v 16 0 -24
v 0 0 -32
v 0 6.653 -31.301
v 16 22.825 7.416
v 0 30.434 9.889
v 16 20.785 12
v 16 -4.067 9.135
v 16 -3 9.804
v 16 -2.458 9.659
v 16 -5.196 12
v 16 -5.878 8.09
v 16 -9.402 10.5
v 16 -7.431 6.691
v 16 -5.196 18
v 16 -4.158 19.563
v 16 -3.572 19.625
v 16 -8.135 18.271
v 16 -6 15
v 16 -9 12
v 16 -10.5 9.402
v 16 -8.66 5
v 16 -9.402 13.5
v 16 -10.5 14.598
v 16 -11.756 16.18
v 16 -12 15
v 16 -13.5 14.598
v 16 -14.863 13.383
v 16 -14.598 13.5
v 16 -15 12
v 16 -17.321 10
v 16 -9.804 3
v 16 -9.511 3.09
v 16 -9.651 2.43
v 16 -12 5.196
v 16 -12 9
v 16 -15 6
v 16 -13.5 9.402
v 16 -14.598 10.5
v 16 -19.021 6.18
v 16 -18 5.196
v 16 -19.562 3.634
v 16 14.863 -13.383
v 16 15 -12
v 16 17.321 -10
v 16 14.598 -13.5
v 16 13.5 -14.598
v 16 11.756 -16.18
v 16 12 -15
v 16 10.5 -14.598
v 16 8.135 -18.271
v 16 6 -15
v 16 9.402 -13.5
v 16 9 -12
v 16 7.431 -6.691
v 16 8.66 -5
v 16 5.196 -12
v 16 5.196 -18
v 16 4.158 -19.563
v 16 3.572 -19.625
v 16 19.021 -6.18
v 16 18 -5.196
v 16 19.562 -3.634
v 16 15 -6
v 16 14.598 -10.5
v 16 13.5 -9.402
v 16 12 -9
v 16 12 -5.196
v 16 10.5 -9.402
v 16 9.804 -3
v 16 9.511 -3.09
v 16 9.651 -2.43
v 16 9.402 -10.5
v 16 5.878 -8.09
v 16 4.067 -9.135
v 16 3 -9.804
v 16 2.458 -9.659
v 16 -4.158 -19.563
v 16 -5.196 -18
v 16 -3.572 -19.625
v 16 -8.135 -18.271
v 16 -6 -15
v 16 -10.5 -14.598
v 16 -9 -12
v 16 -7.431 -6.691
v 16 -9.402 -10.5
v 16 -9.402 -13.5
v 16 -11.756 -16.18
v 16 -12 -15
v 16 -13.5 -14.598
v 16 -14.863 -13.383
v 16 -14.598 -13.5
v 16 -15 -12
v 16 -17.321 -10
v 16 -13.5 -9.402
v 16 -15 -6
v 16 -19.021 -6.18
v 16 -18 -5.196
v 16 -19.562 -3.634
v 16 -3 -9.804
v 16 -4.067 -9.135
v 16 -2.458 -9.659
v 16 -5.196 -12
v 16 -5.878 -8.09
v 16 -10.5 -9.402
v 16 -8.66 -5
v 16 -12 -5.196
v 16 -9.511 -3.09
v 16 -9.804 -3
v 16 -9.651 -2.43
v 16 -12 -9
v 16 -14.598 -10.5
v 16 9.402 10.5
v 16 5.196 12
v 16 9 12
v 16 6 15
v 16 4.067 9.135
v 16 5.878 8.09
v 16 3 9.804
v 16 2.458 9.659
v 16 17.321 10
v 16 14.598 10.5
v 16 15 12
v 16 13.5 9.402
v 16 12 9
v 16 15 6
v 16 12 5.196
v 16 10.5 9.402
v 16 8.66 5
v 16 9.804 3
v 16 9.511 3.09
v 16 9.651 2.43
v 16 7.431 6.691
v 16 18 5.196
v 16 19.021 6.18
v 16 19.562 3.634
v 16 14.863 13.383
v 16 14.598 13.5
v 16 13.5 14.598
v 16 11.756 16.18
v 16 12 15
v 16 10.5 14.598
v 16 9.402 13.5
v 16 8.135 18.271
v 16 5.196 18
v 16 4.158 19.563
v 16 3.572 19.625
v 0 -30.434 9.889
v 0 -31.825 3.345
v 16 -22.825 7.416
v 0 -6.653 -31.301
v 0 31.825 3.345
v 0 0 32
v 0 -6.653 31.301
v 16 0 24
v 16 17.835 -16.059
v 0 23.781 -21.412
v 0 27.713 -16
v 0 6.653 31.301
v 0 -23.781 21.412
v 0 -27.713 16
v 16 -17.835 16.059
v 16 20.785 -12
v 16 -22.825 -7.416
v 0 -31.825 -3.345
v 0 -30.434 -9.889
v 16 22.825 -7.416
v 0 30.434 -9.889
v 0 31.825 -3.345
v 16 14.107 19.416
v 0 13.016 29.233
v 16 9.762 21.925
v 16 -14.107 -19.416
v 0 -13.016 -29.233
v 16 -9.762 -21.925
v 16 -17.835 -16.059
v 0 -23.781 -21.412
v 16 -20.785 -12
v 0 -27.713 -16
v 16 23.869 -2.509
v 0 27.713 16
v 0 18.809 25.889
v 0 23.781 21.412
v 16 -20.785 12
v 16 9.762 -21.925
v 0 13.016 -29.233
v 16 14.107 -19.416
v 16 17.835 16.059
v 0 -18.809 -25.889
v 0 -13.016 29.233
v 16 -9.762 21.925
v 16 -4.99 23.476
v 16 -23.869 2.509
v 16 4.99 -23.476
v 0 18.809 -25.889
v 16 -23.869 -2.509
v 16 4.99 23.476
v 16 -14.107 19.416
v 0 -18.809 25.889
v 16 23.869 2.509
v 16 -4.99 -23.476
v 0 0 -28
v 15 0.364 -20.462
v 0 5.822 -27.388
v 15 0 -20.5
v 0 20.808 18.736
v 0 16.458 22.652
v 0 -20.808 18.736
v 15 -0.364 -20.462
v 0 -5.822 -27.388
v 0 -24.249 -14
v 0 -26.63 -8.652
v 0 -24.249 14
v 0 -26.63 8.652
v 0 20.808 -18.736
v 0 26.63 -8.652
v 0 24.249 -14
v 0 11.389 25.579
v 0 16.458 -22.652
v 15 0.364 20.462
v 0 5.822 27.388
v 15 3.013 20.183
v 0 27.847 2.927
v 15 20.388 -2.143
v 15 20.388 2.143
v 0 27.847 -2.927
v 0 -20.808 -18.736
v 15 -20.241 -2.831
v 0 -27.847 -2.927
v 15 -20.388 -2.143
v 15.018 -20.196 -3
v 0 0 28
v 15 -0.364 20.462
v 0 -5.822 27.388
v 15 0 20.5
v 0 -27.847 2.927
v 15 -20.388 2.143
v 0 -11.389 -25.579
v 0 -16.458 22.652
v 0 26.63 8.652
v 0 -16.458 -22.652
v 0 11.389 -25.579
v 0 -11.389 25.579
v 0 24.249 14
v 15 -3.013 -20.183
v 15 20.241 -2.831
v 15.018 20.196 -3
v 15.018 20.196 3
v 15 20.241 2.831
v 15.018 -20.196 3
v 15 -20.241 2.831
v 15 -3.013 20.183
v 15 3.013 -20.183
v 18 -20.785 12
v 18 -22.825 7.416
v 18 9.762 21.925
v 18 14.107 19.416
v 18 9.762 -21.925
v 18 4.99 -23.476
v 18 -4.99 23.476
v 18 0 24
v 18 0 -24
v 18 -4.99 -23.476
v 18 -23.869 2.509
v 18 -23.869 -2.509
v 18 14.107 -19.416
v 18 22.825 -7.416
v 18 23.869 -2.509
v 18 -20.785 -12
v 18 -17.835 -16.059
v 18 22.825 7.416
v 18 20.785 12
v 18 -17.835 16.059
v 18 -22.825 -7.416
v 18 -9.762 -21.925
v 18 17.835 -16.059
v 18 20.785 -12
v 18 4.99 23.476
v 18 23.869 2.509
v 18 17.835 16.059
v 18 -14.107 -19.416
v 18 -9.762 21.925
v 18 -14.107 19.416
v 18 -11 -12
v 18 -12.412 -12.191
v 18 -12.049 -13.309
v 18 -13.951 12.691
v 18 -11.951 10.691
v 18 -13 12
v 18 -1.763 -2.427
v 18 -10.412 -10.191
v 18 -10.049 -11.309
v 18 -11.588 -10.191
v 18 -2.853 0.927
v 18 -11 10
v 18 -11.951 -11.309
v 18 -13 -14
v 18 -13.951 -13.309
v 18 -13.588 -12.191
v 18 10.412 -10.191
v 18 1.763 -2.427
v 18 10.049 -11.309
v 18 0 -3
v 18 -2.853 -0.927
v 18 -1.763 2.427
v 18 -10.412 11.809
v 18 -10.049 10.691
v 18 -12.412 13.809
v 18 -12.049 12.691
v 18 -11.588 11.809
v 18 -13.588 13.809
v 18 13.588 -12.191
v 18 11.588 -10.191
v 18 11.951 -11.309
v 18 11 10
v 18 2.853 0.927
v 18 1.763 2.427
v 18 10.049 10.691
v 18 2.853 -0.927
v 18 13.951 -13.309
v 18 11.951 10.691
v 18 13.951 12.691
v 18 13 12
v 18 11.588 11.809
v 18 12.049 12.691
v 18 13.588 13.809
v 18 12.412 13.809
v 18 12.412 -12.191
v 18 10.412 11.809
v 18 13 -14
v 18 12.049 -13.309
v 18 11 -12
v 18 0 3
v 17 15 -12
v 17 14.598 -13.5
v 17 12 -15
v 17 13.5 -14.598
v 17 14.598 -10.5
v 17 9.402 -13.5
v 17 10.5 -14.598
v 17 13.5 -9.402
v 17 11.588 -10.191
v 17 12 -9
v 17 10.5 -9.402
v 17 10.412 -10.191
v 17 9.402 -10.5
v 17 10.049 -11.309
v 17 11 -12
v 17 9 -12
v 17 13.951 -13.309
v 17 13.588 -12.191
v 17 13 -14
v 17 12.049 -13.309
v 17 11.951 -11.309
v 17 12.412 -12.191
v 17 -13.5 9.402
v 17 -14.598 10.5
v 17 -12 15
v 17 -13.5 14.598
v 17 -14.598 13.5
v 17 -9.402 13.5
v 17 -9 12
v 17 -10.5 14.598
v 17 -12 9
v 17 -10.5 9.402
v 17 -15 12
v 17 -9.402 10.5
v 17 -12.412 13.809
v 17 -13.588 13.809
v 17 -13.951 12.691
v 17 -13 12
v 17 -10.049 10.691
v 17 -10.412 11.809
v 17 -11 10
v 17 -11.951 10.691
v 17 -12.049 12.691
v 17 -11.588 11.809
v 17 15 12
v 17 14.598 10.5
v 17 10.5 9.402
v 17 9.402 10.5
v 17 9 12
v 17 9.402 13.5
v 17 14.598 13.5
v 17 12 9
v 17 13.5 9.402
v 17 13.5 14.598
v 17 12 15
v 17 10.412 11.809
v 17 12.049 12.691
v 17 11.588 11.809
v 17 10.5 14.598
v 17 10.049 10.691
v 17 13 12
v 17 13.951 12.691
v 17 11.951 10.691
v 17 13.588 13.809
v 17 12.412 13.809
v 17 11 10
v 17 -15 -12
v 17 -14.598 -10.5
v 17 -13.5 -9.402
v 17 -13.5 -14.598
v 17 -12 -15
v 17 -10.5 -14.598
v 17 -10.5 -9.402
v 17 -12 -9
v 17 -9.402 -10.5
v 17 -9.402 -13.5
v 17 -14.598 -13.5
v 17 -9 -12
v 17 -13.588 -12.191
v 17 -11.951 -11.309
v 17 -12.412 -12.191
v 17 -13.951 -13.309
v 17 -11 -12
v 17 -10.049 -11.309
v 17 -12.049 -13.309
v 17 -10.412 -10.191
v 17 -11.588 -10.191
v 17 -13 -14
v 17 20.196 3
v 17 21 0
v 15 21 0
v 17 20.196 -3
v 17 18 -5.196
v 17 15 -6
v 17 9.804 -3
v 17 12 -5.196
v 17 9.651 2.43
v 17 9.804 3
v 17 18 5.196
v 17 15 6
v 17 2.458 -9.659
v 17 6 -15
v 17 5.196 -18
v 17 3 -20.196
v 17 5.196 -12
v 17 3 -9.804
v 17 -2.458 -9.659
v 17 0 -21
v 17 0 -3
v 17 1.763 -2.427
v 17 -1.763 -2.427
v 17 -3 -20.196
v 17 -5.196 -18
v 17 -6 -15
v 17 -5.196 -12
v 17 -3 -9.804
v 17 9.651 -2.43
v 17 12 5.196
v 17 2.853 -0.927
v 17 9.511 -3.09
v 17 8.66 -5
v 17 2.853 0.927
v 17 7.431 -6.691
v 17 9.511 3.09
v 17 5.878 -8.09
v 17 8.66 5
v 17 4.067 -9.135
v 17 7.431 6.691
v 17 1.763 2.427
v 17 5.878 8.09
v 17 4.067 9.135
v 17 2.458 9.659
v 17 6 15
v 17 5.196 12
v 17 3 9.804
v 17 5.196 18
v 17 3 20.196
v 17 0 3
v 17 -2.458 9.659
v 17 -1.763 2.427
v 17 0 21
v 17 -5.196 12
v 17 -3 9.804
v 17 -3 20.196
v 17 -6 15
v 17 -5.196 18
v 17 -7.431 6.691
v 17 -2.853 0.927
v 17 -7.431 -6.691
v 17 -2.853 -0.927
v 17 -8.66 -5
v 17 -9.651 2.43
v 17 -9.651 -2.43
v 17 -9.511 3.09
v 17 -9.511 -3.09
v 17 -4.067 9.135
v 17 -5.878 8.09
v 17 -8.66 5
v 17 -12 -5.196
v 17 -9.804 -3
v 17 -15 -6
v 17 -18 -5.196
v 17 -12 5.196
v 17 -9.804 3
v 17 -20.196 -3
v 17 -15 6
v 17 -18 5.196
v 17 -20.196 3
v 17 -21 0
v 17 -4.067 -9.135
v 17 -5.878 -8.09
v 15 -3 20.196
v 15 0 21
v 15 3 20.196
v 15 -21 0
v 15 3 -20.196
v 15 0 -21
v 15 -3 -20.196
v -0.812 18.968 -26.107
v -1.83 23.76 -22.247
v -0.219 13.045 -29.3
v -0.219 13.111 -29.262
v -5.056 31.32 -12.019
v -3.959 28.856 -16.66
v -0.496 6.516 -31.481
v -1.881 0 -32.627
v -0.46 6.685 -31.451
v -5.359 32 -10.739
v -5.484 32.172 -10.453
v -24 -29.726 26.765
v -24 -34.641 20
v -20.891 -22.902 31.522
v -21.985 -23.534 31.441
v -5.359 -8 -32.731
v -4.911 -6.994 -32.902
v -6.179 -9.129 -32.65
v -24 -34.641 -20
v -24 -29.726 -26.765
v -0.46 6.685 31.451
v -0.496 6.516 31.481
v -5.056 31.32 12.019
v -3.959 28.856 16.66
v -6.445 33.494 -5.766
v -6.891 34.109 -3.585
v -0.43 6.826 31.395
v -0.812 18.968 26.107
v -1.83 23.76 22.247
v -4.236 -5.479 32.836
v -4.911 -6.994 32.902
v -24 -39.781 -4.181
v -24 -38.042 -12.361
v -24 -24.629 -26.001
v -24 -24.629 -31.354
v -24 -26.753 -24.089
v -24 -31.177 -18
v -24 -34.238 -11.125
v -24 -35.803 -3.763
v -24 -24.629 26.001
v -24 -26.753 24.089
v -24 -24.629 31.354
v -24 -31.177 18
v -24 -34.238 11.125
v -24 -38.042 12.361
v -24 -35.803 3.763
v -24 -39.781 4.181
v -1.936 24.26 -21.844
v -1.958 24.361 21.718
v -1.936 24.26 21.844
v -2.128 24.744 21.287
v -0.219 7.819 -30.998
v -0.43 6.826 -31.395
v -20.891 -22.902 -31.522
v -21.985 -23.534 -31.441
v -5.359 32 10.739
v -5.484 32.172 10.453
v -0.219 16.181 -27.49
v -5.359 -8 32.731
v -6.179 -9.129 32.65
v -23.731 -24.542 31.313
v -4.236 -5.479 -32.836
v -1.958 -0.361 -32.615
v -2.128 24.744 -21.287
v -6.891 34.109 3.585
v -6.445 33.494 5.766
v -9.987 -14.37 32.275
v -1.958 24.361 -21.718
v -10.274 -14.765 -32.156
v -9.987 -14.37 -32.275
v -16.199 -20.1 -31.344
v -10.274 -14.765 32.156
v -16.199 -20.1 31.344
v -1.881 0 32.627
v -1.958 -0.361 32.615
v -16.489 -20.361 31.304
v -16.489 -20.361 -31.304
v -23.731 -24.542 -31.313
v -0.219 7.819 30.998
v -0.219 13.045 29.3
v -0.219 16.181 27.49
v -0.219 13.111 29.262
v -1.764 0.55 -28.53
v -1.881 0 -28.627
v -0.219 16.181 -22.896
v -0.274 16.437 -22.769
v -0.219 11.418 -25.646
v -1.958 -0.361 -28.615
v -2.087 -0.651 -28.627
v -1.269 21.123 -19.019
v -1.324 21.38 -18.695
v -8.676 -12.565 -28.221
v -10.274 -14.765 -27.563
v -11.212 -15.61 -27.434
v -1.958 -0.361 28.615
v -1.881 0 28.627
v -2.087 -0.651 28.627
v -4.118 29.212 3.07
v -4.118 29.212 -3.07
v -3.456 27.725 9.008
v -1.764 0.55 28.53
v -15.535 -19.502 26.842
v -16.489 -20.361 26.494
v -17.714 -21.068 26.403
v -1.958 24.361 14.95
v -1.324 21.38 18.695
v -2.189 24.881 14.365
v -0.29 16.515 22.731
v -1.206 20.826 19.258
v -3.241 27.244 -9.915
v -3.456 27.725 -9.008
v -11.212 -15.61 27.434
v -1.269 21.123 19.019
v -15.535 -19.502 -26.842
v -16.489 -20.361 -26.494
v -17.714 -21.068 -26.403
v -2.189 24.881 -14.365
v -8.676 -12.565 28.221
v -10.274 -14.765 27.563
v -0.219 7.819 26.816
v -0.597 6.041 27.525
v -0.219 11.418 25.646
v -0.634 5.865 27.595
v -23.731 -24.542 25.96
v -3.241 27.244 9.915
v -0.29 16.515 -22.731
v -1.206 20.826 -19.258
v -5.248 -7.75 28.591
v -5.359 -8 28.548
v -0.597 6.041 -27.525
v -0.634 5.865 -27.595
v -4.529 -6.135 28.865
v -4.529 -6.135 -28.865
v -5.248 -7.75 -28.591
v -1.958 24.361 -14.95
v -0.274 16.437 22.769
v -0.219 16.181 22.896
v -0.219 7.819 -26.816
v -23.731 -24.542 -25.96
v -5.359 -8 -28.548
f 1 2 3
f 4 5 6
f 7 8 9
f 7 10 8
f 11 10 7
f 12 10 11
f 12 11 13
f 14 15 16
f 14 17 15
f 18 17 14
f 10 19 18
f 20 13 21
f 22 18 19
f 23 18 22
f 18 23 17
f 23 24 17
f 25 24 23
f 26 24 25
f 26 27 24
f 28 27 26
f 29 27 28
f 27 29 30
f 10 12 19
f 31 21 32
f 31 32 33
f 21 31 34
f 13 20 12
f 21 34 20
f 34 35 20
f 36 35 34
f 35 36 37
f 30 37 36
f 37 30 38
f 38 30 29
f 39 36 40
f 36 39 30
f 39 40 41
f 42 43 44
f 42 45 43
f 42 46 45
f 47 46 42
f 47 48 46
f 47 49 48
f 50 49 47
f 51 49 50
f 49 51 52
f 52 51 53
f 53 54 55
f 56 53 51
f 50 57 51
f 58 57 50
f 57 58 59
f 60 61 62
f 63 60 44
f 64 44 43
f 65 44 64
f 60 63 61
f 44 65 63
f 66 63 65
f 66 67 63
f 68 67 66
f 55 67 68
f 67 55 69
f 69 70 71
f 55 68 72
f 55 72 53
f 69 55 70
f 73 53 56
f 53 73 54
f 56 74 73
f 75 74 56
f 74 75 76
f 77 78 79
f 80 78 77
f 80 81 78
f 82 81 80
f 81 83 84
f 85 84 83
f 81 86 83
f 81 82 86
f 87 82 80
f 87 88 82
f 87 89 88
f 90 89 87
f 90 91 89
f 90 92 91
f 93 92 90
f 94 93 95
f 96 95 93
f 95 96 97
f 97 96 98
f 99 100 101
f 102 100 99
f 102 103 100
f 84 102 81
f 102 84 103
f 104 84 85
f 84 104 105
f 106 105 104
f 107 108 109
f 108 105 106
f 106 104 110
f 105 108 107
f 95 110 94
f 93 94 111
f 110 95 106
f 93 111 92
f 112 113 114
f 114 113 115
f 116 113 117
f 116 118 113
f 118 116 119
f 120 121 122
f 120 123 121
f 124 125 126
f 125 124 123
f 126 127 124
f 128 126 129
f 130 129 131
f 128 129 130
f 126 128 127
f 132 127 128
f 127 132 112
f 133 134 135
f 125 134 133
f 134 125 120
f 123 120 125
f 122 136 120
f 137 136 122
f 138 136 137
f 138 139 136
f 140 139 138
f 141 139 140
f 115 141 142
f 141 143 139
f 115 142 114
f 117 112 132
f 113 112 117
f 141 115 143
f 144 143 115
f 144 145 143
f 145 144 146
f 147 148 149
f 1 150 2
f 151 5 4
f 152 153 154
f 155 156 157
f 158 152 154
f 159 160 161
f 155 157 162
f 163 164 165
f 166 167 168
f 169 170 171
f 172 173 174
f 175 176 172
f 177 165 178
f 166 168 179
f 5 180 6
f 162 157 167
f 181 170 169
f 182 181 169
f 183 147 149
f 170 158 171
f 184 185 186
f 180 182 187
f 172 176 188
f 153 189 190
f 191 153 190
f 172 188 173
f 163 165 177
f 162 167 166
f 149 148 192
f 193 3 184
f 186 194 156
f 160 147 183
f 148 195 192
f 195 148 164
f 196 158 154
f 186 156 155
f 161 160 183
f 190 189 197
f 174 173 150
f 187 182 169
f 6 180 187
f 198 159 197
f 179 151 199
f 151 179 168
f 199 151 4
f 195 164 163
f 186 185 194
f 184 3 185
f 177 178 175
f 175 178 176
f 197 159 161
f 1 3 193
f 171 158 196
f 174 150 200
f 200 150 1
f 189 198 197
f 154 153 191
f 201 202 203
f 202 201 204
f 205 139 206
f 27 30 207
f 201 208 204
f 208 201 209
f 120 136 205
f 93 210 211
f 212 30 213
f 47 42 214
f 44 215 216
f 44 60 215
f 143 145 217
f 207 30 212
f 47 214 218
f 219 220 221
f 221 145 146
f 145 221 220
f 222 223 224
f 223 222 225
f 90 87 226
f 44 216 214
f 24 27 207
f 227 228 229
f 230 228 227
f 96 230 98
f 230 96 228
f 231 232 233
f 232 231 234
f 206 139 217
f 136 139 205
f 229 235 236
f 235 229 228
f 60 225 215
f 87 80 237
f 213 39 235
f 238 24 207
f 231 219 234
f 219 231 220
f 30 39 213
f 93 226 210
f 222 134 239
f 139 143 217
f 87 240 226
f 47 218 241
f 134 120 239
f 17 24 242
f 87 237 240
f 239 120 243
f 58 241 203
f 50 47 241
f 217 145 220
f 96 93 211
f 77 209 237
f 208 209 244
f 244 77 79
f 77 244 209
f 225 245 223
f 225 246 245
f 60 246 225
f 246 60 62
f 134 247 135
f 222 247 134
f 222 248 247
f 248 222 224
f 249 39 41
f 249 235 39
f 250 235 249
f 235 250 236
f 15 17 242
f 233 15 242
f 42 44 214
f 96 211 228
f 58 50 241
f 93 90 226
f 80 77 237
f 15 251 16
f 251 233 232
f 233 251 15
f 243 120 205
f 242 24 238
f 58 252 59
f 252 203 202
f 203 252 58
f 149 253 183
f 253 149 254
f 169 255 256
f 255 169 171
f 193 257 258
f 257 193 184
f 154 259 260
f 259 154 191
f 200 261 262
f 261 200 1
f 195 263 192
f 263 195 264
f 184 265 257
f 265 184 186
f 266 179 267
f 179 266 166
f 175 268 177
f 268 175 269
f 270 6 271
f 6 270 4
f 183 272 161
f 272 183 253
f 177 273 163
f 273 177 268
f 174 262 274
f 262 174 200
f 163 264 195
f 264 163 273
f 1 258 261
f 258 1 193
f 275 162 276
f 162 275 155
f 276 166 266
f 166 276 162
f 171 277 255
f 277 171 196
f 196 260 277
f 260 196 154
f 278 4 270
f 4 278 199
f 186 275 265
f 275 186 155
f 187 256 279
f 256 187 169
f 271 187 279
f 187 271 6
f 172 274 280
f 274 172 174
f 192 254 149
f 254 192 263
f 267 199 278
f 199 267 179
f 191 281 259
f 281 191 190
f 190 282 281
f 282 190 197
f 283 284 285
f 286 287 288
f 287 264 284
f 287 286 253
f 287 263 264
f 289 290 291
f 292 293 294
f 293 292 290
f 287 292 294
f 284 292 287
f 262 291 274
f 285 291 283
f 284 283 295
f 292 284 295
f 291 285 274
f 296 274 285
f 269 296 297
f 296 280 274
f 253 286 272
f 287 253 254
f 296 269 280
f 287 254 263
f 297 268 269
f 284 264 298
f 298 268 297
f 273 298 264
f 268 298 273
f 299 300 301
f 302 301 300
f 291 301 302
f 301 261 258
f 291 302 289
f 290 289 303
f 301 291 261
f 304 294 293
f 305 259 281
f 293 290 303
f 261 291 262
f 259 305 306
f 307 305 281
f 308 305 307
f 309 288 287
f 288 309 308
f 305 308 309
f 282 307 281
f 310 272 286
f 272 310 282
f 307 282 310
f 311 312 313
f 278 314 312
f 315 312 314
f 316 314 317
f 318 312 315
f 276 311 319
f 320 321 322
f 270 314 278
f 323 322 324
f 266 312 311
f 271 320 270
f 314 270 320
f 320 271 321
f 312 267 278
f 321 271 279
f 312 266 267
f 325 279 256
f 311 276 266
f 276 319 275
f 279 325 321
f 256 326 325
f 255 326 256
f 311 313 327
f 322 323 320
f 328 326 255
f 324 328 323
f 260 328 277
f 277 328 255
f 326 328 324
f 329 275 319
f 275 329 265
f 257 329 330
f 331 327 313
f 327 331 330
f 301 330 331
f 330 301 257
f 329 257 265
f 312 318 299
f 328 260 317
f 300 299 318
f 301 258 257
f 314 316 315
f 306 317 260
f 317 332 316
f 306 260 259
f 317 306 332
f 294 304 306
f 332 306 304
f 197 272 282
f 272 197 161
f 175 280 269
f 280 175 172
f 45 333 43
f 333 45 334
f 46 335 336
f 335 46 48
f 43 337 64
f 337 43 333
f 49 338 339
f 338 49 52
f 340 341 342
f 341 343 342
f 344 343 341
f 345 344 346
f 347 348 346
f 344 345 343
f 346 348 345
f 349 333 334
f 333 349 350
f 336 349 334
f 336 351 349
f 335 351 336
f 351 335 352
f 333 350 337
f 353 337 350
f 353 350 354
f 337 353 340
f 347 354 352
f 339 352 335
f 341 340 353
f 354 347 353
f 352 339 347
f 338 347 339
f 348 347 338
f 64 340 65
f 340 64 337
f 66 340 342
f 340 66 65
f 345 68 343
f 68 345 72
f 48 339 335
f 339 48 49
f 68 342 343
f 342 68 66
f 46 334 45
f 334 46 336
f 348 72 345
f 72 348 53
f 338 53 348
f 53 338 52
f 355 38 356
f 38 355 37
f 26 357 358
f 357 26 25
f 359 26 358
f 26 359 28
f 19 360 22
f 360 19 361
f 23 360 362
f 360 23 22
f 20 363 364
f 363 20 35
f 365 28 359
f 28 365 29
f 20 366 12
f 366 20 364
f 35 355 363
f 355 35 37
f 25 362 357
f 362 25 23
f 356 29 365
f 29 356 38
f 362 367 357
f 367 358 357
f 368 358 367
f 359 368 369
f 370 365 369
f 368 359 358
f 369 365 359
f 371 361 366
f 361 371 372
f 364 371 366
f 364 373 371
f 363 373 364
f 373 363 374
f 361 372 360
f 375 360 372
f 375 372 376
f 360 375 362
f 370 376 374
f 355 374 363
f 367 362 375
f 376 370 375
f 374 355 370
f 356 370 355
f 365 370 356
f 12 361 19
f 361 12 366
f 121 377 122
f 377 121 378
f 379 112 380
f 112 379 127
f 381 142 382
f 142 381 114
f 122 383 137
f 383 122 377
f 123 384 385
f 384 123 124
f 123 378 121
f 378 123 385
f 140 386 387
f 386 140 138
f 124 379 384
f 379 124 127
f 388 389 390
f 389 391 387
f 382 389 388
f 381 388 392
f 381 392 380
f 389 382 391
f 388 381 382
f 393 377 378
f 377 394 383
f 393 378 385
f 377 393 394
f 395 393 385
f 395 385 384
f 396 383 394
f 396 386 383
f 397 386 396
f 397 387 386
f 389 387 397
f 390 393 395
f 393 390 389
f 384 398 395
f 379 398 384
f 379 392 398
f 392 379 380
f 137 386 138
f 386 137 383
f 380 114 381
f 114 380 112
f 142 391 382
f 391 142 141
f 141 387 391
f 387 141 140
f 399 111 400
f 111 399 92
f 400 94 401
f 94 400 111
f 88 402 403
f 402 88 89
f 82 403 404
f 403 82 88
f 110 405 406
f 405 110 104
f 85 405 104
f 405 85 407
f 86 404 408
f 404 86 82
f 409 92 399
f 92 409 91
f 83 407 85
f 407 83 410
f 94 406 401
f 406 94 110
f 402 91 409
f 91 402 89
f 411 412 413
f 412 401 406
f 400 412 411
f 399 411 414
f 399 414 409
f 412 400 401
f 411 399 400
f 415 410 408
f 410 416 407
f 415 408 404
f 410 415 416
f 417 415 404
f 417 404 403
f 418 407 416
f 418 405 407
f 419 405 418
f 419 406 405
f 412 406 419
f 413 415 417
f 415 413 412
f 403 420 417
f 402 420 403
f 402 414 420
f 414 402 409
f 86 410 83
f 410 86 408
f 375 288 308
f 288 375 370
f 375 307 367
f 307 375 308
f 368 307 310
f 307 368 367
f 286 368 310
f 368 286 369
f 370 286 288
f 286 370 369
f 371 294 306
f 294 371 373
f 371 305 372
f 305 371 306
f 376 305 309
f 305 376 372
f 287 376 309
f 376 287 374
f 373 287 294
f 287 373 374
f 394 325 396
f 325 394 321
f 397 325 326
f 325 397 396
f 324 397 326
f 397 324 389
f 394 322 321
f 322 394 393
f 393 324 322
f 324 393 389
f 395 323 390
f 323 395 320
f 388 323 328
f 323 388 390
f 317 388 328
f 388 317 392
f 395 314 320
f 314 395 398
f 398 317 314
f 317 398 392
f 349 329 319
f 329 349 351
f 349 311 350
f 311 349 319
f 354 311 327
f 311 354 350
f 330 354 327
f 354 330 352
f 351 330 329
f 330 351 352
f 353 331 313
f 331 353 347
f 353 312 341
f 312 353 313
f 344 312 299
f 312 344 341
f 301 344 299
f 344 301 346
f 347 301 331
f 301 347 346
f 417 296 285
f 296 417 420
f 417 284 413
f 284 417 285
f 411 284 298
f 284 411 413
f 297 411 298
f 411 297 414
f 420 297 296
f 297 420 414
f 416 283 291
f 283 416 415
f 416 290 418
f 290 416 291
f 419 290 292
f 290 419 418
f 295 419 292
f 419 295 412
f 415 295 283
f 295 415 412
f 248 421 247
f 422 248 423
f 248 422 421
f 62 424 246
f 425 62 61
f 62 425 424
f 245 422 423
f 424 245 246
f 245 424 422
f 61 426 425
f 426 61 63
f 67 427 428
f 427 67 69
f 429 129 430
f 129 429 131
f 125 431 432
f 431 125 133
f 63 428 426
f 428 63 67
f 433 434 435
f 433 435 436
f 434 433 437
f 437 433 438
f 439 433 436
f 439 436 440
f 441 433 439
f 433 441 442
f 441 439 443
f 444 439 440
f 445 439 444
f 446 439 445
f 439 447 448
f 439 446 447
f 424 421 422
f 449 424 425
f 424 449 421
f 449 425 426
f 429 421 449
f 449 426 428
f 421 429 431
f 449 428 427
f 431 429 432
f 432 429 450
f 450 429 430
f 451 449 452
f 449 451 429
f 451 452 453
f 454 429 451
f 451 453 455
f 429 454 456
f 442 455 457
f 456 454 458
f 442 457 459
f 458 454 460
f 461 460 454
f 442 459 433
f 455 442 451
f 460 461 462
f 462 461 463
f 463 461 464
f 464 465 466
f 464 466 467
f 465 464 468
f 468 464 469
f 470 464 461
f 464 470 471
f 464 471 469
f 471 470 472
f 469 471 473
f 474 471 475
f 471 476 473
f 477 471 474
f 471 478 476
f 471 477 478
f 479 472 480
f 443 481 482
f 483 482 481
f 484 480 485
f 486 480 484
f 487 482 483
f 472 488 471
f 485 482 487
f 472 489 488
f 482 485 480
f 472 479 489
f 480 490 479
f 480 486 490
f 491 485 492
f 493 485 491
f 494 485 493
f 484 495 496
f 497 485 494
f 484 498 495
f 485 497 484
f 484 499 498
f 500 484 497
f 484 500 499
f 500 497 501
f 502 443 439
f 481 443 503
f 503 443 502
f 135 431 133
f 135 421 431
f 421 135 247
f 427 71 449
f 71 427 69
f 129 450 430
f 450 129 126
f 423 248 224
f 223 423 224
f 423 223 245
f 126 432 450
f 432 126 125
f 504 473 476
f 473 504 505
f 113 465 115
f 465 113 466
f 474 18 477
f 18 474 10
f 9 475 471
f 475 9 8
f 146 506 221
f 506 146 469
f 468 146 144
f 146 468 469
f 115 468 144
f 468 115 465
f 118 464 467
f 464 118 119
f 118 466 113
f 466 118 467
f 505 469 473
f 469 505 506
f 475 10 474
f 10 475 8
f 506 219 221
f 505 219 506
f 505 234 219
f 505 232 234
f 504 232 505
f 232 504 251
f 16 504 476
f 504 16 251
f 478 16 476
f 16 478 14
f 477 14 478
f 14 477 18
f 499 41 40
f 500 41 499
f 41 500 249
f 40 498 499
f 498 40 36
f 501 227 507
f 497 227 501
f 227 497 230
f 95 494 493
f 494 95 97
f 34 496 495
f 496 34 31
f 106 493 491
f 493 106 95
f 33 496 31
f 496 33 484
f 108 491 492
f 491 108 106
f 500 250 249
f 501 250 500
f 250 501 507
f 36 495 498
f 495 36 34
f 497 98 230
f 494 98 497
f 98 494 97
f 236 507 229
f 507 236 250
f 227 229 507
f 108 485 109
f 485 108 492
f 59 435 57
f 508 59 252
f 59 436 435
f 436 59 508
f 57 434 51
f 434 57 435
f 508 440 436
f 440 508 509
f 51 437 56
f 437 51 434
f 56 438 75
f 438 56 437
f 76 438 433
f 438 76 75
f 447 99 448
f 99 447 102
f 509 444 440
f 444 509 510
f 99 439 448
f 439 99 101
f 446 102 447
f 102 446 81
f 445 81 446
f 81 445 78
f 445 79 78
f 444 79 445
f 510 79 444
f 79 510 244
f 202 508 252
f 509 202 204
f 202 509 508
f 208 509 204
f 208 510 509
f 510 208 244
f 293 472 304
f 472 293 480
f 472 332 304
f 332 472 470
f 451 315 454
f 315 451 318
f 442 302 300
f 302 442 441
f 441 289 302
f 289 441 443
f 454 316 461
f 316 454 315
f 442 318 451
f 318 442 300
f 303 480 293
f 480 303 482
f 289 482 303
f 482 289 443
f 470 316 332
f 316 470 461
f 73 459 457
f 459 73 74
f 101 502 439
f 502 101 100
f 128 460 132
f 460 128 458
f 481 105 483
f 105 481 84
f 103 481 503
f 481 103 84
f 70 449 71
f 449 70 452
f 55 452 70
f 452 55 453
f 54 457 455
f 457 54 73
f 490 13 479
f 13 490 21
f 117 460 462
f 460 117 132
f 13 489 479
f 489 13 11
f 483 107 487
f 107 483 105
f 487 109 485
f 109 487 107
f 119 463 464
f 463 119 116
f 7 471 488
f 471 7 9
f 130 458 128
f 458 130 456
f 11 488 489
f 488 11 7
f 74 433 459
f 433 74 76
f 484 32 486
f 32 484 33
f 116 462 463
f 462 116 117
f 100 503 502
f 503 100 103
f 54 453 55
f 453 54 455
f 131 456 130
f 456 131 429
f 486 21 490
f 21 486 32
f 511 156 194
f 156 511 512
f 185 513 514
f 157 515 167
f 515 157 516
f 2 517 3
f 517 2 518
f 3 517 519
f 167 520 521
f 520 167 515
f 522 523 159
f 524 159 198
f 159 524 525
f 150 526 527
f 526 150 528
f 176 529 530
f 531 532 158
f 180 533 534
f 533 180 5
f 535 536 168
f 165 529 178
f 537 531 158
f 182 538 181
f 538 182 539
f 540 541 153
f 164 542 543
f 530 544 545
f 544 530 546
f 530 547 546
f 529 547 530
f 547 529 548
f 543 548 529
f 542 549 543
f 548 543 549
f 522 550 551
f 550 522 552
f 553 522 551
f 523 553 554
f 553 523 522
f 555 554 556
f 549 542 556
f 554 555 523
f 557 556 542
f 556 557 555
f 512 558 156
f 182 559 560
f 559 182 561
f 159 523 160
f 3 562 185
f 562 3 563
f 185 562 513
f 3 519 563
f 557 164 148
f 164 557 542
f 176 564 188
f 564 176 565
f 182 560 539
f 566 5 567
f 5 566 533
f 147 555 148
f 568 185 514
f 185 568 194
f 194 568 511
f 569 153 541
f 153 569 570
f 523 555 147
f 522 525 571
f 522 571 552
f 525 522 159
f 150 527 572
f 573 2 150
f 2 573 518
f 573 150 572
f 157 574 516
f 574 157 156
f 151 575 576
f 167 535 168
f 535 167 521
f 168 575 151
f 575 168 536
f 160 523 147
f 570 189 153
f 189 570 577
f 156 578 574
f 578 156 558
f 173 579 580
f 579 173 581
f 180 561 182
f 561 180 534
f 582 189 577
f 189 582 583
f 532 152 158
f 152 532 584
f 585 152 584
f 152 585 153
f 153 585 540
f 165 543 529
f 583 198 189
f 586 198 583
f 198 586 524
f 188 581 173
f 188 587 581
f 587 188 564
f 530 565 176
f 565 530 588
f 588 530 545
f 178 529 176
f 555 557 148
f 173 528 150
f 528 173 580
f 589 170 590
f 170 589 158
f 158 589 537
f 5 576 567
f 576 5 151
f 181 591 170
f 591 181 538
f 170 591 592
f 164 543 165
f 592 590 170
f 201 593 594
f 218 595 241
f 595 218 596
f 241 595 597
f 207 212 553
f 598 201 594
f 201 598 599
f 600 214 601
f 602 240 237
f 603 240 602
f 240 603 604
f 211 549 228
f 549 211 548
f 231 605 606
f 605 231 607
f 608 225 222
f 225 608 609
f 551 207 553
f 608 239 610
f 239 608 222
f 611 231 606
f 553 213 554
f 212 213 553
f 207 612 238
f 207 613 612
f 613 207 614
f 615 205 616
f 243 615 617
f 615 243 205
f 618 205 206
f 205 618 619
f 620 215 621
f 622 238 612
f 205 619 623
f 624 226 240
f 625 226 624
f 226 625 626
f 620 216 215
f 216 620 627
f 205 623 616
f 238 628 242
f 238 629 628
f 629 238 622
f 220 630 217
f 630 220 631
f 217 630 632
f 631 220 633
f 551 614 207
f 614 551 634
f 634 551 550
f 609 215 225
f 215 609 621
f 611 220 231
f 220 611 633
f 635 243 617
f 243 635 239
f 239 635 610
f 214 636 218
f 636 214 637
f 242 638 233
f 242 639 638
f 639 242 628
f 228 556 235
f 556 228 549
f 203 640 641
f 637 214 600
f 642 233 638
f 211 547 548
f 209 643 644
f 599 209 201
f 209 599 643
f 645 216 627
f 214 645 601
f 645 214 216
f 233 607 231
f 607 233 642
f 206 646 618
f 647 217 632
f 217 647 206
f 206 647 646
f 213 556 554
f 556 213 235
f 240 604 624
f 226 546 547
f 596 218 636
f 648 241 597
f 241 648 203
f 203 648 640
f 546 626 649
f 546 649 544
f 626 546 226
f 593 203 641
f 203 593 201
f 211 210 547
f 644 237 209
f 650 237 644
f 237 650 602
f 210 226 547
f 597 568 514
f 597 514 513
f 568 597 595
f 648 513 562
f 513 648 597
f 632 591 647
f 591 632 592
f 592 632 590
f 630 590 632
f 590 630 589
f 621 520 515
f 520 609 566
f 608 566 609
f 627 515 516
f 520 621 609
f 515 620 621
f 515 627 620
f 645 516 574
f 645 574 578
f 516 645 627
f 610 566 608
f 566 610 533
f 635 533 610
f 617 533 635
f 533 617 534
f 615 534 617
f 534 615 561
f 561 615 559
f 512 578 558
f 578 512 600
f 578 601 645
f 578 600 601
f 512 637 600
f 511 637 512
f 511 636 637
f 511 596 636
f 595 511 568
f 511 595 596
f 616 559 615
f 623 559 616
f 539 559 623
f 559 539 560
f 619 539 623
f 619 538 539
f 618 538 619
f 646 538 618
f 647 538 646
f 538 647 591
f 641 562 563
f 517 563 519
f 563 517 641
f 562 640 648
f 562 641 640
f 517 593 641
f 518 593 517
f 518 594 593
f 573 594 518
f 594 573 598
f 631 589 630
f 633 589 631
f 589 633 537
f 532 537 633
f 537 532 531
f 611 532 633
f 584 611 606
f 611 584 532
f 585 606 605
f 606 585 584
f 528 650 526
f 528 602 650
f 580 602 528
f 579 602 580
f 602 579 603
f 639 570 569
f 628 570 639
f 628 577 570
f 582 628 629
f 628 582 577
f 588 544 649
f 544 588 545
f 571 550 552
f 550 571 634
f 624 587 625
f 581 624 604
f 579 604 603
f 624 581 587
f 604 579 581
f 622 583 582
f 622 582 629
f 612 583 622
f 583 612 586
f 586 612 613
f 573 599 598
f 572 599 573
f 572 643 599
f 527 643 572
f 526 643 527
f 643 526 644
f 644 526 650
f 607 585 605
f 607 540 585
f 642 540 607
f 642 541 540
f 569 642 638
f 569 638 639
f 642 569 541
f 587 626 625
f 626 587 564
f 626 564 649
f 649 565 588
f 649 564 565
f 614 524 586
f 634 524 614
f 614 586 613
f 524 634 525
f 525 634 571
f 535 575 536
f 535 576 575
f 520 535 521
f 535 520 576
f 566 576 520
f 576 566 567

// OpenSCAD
//goggles
//union(){}
//intersection(){
//cylinder(height, r1, r2, center=true/false)


union(){


difference(){
union(){
translate([16,0,0]) rotate([90,90,90]) cylinder(2,24,24);
difference(){
translate([0,0,0]) rotate([90,90,90]) cylinder(16,32,24);
translate([0,0,0]) rotate([90,90,90]) cylinder(16,28,20);
}
}
//LED holes
translate([15,12,-12]) rotate([90,90,90]) cylinder(2,3,3,$fn = 12);
translate([15,-12,12]) rotate([90,90,90]) cylinder(2,3,3,$fn = 12);
translate([15,12,12]) rotate([90,90,90]) cylinder(2,3,3,$fn = 12);
translate([15,-12,-12]) rotate([90,90,90]) cylinder(2,3,3,$fn = 12);
//pin holes
translate([15,-13,13]) rotate([90,90,90]) cylinder(4,1,1);
translate([15,-11,11]) rotate([90,90,90]) cylinder(4,1,1);

translate([15,13,13]) rotate([90,90,90]) cylinder(4,1,1);
translate([15,11,11]) rotate([90,90,90]) cylinder(4,1,1);

translate([15,13,-13]) rotate([90,90,90]) cylinder(4,1,1);
translate([15,11,-11]) rotate([90,90,90]) cylinder(4,1,1);

translate([15,-13,-13]) rotate([90,90,90]) cylinder(4,1,1);
translate([15,-11,-11]) rotate([90,90,90]) cylinder(4,1,1);
//neopixel holes
translate([15,15,0]) rotate([90,90,90]) cylinder(2,6,6,$fn = 12);
translate([15,0,15]) rotate([90,90,90]) cylinder(2,6,6,$fn = 12);
translate([15,-15,0]) rotate([90,90,90]) cylinder(2,6,6,$fn = 12);
translate([15,0,-15]) rotate([90,90,90]) cylinder(2,6,6,$fn = 12);
//camera aperture
translate([15,0,0]) rotate([90,90,90]) cylinder(4,3,3);
//lens inset
translate([15,0,0]) rotate([90,90,90]) cylinder(2,10,10);
}
//translate([-16,0,0])
difference(){
difference(){
translate([-24,0,0]) rotate([90,90,90]) cylinder(24,40,32);
translate([-24,0,0]) rotate([90,90,90]) cylinder(24,36,28);
}


//vertical cylinder cut
translate([-40,12,-40]) rotate([0,0,90]) cylinder(80,40,40);
//sphere cut
//translate([-20,2,0]) sphere(22);
//cylinder cut
//translate([-20,2,0]) rotate([97,90,90]) cylinder(20,28,14);


}
}
